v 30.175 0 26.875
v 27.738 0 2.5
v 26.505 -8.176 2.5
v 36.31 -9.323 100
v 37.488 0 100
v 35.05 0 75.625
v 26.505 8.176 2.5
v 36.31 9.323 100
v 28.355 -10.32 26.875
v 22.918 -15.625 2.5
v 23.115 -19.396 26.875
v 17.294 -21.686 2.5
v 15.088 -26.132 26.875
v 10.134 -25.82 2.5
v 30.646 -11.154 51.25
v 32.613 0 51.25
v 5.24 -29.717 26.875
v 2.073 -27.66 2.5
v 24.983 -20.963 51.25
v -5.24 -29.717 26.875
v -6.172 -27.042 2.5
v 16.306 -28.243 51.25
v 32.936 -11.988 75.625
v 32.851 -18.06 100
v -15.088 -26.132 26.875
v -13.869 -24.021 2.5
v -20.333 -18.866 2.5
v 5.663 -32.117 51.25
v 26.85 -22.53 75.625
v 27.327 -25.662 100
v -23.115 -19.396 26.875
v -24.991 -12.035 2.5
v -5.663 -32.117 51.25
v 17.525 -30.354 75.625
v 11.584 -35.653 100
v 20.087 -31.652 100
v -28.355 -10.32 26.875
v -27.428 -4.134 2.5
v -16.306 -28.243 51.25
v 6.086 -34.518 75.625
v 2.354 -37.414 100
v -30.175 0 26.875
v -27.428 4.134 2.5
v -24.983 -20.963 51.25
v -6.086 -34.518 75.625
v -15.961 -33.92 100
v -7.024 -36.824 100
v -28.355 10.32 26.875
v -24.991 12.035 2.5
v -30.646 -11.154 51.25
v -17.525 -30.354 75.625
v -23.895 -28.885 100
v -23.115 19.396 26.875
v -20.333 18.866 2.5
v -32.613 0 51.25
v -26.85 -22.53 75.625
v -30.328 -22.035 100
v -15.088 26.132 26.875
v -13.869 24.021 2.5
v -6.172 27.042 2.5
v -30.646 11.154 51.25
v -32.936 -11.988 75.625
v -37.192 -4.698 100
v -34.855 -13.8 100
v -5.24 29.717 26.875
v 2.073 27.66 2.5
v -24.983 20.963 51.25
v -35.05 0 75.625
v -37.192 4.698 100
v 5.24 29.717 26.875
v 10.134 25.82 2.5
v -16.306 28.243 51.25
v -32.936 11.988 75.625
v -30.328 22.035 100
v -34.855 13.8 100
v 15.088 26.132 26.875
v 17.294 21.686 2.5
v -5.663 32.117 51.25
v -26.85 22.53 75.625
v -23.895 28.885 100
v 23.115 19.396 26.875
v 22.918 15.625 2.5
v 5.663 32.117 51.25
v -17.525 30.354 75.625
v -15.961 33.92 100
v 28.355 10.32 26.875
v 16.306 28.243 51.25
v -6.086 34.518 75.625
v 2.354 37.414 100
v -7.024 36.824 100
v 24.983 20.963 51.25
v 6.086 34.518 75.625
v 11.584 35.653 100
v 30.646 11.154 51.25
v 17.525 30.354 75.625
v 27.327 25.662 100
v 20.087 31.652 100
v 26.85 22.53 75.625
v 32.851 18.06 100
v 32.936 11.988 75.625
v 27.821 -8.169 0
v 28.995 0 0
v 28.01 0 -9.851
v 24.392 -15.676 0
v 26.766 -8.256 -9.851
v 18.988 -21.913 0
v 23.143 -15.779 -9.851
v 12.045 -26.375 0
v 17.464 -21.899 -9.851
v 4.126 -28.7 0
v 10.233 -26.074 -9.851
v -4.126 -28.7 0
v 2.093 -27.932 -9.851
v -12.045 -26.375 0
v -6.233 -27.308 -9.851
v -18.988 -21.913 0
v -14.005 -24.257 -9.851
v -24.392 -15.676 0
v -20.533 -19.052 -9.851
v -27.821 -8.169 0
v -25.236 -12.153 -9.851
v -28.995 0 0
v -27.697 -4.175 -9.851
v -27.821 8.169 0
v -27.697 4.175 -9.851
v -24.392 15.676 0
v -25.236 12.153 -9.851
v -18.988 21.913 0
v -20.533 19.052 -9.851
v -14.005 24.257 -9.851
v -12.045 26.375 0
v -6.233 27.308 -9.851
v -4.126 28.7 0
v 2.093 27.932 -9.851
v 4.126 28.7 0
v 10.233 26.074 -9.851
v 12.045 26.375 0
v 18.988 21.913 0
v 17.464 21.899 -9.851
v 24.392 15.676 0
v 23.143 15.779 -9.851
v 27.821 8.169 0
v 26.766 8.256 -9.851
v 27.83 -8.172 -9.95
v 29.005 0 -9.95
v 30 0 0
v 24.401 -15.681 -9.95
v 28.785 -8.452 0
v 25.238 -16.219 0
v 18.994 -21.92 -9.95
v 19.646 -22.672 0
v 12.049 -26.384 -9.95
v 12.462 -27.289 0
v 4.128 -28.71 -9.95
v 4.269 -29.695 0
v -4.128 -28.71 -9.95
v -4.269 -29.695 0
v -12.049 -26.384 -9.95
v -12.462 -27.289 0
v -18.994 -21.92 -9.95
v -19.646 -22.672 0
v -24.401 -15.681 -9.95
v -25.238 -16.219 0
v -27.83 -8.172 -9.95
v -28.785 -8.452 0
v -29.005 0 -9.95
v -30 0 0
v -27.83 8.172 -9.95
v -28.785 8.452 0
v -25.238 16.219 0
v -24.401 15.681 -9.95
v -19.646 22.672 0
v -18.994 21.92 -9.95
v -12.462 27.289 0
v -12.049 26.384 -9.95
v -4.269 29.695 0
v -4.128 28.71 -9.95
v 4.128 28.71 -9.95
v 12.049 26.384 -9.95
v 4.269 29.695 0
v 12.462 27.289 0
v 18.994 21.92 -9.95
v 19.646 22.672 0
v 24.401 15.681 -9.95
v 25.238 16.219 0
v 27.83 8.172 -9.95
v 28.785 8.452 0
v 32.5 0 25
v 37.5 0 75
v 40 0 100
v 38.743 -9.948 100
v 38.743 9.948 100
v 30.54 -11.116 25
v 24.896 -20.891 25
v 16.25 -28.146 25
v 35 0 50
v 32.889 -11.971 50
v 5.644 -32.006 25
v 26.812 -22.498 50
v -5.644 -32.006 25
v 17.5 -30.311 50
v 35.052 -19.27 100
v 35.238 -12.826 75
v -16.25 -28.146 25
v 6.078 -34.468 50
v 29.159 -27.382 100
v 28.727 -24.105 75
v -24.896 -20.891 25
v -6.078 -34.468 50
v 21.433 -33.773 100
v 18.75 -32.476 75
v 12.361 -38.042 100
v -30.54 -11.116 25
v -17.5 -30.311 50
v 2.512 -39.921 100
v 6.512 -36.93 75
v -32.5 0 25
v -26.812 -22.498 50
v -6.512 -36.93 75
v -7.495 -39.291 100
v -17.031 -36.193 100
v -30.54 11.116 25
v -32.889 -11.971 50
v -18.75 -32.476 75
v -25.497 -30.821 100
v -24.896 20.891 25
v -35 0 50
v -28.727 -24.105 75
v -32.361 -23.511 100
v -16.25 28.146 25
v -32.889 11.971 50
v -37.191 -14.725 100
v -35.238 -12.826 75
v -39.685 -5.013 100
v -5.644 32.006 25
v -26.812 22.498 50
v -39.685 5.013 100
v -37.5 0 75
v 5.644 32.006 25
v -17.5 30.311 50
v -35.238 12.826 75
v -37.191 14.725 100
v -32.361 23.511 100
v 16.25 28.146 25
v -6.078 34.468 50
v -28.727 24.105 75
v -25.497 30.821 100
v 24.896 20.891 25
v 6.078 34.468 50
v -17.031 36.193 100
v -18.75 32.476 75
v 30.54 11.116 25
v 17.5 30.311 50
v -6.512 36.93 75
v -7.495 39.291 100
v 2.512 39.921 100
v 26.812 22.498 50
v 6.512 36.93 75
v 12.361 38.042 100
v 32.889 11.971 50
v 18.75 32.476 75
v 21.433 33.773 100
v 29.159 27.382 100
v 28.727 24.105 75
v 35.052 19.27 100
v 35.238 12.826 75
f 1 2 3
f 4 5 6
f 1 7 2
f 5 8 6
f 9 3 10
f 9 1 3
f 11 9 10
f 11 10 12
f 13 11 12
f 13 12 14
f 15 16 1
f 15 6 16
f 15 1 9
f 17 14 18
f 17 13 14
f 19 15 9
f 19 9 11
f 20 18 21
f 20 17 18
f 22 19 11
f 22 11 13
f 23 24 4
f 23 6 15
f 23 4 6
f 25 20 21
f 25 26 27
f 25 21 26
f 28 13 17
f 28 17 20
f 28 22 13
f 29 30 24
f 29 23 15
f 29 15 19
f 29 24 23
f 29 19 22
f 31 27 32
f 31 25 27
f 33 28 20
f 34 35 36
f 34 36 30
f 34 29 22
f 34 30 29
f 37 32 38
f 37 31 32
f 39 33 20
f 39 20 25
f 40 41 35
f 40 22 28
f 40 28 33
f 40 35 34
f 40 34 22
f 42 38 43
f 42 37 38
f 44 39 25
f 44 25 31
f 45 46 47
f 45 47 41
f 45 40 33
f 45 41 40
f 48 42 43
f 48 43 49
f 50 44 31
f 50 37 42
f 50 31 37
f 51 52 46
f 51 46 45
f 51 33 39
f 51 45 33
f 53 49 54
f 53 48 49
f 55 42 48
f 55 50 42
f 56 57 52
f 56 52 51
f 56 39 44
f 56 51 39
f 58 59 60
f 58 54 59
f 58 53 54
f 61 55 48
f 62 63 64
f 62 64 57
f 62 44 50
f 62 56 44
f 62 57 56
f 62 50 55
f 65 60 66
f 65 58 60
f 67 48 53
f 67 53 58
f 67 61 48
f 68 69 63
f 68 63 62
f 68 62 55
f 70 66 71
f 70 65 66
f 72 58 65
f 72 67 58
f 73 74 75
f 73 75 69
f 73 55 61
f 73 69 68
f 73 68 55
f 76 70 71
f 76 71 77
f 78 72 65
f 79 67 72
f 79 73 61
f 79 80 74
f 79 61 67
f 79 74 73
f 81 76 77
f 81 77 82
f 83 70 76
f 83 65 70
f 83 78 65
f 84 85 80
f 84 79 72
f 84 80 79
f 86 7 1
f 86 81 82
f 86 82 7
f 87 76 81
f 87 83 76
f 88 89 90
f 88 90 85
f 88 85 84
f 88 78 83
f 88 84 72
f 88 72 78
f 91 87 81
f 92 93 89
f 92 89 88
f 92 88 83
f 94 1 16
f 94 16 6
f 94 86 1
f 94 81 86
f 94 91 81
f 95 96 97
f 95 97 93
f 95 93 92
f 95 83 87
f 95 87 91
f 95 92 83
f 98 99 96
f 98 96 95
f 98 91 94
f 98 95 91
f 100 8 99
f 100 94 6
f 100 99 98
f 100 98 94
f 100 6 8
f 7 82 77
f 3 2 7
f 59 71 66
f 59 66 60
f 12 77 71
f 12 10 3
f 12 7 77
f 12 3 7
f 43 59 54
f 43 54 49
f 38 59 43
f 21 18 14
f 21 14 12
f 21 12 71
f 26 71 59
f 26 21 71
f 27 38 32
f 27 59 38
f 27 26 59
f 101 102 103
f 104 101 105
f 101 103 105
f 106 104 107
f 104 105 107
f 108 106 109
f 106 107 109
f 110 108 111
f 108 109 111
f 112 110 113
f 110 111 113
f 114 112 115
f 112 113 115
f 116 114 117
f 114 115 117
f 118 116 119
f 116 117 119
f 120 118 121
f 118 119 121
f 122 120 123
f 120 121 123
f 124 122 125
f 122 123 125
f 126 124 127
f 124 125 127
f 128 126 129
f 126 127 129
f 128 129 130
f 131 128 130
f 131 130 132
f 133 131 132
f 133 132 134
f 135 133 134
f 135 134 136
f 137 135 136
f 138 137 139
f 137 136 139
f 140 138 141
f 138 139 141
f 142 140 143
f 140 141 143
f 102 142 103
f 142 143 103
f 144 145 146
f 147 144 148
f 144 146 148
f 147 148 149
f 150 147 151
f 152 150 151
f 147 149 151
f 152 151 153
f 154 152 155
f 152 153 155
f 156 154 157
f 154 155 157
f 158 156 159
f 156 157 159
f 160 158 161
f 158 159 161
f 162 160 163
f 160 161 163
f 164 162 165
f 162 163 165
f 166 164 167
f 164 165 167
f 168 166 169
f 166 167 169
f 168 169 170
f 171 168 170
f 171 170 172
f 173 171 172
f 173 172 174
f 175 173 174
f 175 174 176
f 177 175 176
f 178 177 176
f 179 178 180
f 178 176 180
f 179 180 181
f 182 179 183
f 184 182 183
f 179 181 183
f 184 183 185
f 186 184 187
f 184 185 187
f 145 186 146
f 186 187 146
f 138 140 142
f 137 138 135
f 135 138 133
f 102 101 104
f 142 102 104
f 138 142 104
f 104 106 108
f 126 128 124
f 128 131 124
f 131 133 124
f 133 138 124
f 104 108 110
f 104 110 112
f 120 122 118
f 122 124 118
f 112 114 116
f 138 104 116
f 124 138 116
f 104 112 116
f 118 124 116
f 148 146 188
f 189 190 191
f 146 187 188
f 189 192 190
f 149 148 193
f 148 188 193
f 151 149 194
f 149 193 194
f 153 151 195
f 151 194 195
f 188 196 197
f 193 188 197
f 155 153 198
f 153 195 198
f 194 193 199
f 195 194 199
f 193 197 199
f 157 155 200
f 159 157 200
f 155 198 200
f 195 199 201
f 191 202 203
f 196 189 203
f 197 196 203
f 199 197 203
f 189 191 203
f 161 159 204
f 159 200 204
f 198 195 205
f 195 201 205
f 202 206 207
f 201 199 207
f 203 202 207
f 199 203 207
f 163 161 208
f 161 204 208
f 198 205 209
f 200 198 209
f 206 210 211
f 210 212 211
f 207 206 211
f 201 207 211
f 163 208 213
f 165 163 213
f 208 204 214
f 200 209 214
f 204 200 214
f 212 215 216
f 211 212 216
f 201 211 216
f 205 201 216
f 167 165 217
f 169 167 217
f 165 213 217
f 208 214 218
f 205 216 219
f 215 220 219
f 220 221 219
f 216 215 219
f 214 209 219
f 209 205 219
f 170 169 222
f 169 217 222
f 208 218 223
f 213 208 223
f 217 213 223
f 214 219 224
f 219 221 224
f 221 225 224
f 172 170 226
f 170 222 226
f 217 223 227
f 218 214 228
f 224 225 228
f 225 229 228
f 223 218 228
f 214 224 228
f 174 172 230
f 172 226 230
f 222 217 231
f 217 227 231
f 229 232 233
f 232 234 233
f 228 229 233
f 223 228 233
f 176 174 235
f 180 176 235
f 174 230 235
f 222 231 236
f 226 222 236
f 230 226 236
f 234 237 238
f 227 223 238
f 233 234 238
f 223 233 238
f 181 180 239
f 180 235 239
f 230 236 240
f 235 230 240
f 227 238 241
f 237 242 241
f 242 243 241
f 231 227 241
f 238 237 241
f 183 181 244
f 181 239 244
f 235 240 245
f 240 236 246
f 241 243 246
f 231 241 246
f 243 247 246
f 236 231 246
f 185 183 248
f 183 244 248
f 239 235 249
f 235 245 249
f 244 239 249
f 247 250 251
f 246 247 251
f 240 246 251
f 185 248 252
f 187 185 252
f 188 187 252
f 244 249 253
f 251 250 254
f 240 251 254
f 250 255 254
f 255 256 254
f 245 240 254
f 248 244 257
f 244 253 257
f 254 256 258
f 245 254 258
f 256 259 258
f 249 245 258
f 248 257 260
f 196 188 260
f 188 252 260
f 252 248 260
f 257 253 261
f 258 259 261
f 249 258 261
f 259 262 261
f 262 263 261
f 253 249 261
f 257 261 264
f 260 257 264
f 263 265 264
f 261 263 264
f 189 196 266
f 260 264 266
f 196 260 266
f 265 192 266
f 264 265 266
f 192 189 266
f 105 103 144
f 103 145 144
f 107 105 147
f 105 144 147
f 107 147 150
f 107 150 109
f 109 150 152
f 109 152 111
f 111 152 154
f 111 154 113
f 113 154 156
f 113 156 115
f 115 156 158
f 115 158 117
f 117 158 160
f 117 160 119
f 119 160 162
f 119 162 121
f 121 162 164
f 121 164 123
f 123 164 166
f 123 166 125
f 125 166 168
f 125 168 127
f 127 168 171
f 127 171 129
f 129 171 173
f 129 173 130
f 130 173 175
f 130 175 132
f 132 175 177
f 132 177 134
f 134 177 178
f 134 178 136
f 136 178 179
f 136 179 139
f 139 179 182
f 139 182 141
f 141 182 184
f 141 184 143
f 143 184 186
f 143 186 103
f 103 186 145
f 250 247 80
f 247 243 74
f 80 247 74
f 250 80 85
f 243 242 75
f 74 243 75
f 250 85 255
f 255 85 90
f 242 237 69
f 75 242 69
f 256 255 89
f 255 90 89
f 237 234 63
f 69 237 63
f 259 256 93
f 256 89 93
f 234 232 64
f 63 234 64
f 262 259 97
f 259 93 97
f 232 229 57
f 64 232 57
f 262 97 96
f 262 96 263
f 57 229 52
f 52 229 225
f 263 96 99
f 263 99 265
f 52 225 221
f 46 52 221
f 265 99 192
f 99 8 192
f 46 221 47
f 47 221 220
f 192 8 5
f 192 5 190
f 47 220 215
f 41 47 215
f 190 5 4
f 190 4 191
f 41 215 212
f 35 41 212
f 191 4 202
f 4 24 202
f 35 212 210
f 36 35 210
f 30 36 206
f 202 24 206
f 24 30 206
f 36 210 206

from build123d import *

# Parameters (mm, degrees)
F2_T = -2.5


with BuildPart() as f1:
    # F0 (on Front) → F1 (revolve)
    with BuildSketch(Plane.XZ):
        Polygon((40, 100), (0, 100), (0, 0), (28.995012, 0), (30, 0), align=None)
        Polygon((29.004963, -9.950372), (30, 0), (28.995012, 0), (28.009926, -9.850868), align=None)
    revolve(axis=Axis((0, 0, 50), (0, 0, -1)))

    # F2
    f2_openings = [f1.faces().sort_by_distance(p)[0] for p in [
        (0, 0, 100),
    ]]
    offset(amount=F2_T, openings=f2_openings)


solid = f1.part
